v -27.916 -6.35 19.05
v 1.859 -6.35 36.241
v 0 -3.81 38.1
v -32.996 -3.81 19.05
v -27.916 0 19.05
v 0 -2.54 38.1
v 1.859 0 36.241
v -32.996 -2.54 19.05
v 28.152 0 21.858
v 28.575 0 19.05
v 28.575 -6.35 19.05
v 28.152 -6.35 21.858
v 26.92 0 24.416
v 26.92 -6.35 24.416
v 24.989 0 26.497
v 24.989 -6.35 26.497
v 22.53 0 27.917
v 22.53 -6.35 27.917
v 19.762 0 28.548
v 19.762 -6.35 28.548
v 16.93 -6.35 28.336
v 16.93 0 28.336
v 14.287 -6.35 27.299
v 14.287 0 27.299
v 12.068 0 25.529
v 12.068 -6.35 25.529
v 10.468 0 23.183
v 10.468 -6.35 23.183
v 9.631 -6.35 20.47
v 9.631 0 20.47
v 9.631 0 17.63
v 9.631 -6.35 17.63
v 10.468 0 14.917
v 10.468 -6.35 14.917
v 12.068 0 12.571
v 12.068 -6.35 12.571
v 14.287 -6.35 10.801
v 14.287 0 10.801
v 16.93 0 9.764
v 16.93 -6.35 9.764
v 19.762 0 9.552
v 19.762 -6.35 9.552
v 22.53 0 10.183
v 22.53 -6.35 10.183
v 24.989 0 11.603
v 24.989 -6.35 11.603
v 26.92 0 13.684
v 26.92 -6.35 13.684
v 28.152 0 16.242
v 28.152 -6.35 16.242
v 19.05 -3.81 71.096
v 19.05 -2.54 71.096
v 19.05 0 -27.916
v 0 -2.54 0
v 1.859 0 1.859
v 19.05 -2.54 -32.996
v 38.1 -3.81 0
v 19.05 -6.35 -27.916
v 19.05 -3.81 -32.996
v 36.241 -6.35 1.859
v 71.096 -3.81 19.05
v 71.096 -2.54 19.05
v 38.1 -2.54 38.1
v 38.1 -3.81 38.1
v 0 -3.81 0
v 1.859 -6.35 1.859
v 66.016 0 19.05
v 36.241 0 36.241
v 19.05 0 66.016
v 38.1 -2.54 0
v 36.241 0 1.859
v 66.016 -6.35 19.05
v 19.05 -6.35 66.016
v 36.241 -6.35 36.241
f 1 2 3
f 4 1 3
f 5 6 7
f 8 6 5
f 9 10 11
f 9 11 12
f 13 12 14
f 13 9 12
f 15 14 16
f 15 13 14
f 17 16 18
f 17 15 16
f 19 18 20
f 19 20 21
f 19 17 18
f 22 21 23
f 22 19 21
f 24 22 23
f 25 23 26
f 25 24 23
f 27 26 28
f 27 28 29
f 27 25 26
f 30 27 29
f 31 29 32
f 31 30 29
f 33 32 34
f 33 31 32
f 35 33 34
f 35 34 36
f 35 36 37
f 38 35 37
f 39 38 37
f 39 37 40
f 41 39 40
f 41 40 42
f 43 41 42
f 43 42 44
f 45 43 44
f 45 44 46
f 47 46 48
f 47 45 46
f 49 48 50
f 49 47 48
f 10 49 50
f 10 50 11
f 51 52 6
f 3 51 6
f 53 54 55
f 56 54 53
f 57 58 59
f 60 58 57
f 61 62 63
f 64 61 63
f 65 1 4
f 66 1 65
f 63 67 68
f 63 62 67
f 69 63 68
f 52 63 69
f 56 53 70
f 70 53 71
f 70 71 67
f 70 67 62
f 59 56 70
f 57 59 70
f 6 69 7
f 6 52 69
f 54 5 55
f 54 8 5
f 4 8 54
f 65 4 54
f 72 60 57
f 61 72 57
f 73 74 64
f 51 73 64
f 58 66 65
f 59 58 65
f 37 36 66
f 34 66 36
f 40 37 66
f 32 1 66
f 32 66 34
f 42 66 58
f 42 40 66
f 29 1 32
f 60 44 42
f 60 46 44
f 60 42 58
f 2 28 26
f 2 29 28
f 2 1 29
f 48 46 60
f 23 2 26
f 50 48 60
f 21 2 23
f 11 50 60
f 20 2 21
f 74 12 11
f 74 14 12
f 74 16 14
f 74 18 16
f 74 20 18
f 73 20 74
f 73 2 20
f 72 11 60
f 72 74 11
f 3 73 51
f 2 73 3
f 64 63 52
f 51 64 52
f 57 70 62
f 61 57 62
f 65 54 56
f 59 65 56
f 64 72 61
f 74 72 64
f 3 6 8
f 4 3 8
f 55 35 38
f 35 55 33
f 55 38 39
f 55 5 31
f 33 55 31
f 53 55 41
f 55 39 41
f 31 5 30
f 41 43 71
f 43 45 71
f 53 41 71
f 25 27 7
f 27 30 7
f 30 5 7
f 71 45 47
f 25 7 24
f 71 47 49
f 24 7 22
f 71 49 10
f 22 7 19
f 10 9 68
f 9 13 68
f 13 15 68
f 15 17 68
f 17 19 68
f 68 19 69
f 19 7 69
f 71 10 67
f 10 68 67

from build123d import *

# Parameters (mm, degrees)
F0_W     = 38.1
F0_H     = 38.1
F0_R     = 9.525
F1_DEPTH = 6.35
F2_SIZE  = 2.54
F3_SIZE  = 2.54


with BuildPart() as f1:
    # F0 (on Front) → F1 (new body)
    with BuildSketch(Plane.XZ):
        with Locations((19.05, 19.05)):
            Rectangle(F0_W, F0_H)
        with Locations((19.05, 19.05)):
            Circle(F0_R, mode=Mode.SUBTRACT)
        Polygon((19.05, 71.095568), (0, 38.1), (38.1, 38.1), align=None)
        Polygon((-32.995568, 19.05), (0, 0), (0, 38.1), align=None)
        Polygon((38.1, 38.1), (38.1, 0), (71.095568, 19.05), align=None)
        Polygon((38.1, 0), (0, 0), (19.05, -32.995568), align=None)
    extrude(amount=F1_DEPTH)

    # F2
    f2_edges = [f1.edges().sort_by_distance(p)[0] for p in [
        (9.525, -6.35, 54.597784),
        (-16.497784, -6.35, 28.575),
        (-16.497784, -6.35, 9.525),
        (9.525, -6.35, -16.497784),
        (28.575, -6.35, -16.497784),
        (54.597784, -6.35, 9.525),
        (54.597784, -6.35, 28.575),
        (28.575, -6.35, 54.597784),
    ]]
    chamfer(f2_edges, length=F2_SIZE)

    # F3
    f3_edges = [f1.edges().sort_by_distance(p)[0] for p in [
        (9.525, 0, -16.497784),
        (28.575, 0, -16.497784),
        (54.597784, 0, 9.525),
        (54.597784, 0, 28.575),
        (28.575, 0, 54.597784),
        (9.525, 0, 54.597784),
        (-16.497784, 0, 28.575),
        (-16.497784, 0, 9.525),
    ]]
    chamfer(f3_edges, length=F3_SIZE)


solid = f1.part
